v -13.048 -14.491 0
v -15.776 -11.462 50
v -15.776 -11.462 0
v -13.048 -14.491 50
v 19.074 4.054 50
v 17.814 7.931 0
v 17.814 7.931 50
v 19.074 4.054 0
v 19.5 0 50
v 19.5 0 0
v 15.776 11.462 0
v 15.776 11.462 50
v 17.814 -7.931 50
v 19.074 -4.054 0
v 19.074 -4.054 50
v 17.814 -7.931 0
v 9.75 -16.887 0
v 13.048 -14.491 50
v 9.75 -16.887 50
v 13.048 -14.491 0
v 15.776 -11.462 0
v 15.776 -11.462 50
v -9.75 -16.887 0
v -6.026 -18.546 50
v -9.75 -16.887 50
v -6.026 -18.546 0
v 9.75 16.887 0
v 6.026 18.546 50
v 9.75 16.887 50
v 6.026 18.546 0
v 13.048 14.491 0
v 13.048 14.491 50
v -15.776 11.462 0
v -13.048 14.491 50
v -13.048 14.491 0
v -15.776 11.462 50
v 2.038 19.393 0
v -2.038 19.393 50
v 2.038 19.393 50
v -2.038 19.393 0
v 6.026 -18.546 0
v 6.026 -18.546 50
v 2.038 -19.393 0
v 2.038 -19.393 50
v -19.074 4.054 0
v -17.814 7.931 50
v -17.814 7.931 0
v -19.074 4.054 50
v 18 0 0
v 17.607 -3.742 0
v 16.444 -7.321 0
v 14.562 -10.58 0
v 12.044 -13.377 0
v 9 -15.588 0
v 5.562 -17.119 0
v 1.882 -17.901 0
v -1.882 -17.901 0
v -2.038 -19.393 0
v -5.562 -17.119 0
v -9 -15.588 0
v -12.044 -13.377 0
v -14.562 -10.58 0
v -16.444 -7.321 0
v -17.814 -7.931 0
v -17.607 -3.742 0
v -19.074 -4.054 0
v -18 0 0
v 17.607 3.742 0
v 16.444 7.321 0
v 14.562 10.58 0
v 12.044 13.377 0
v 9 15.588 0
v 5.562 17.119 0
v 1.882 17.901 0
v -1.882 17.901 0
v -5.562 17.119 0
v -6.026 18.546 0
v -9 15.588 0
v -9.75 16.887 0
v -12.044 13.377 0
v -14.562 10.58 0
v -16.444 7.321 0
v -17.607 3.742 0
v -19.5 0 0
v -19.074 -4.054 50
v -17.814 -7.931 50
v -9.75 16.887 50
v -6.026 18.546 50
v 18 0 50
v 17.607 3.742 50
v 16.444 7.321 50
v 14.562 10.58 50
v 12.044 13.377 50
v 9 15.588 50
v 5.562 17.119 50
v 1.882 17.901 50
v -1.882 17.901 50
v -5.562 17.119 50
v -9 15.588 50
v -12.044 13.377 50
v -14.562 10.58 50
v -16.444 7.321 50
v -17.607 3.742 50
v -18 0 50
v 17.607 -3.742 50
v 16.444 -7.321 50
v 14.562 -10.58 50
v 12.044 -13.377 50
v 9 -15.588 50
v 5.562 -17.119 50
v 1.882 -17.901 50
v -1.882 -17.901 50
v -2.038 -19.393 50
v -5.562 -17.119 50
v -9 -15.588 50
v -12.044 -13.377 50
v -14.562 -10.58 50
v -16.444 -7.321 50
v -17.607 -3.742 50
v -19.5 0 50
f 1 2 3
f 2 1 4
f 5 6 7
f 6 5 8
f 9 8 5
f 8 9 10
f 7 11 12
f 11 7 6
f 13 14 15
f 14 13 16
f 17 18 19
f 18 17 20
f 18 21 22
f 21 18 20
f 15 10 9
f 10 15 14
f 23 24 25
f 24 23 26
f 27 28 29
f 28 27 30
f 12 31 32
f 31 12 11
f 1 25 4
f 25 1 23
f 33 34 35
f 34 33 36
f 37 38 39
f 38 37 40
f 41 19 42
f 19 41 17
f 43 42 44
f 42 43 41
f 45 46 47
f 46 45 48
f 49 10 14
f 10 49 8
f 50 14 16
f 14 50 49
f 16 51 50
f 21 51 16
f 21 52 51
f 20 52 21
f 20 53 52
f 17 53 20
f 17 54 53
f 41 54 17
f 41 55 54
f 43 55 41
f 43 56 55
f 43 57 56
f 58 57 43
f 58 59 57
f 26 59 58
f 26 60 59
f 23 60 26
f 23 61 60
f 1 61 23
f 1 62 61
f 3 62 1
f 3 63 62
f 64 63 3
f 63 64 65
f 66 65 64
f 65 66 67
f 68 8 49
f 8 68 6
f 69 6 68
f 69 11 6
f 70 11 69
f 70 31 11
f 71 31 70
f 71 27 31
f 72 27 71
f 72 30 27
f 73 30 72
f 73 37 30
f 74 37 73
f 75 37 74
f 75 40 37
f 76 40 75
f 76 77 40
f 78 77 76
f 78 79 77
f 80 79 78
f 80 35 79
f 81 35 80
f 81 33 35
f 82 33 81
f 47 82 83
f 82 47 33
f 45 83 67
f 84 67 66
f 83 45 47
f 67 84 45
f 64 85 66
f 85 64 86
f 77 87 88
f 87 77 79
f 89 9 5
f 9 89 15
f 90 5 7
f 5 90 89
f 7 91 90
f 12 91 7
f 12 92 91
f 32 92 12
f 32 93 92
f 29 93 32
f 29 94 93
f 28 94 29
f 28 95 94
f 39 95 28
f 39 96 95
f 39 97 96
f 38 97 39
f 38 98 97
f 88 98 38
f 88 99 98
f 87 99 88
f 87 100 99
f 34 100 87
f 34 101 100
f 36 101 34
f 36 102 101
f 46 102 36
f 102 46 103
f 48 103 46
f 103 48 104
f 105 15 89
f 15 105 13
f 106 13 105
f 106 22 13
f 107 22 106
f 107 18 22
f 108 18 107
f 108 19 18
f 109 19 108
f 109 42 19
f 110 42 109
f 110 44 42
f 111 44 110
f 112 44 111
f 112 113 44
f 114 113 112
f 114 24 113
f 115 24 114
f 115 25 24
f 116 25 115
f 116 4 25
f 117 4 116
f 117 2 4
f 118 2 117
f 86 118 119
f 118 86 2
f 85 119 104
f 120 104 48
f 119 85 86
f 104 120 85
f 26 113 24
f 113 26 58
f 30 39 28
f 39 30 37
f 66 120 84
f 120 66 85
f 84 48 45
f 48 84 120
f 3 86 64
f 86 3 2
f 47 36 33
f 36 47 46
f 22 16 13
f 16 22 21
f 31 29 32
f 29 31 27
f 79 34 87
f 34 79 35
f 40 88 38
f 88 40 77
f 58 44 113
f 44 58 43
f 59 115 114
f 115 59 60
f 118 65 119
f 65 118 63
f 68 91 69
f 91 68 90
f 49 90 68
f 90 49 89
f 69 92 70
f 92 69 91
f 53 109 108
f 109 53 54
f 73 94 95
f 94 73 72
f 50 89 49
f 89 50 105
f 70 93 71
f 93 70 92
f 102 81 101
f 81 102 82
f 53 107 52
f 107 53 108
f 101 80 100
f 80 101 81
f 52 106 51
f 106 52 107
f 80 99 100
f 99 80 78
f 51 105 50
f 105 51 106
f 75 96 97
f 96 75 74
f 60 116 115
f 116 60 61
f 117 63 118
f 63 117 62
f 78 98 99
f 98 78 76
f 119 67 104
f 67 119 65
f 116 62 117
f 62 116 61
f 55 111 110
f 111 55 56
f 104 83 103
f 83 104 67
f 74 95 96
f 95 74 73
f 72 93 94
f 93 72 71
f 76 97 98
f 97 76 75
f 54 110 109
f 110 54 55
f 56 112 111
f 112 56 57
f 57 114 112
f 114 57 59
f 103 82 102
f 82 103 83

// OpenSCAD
insideHose=39;
outsideSander=36;

union(){
    tube(50, insideHose, outsideSander);
}

module tube(height, lower, upper) {
    difference() {
        cylinder(h=height, d1=lower, d2=lower);
        translate([0, 0, -1])
        cylinder(h=height+2, d1=upper, d2=upper);
    }
}
